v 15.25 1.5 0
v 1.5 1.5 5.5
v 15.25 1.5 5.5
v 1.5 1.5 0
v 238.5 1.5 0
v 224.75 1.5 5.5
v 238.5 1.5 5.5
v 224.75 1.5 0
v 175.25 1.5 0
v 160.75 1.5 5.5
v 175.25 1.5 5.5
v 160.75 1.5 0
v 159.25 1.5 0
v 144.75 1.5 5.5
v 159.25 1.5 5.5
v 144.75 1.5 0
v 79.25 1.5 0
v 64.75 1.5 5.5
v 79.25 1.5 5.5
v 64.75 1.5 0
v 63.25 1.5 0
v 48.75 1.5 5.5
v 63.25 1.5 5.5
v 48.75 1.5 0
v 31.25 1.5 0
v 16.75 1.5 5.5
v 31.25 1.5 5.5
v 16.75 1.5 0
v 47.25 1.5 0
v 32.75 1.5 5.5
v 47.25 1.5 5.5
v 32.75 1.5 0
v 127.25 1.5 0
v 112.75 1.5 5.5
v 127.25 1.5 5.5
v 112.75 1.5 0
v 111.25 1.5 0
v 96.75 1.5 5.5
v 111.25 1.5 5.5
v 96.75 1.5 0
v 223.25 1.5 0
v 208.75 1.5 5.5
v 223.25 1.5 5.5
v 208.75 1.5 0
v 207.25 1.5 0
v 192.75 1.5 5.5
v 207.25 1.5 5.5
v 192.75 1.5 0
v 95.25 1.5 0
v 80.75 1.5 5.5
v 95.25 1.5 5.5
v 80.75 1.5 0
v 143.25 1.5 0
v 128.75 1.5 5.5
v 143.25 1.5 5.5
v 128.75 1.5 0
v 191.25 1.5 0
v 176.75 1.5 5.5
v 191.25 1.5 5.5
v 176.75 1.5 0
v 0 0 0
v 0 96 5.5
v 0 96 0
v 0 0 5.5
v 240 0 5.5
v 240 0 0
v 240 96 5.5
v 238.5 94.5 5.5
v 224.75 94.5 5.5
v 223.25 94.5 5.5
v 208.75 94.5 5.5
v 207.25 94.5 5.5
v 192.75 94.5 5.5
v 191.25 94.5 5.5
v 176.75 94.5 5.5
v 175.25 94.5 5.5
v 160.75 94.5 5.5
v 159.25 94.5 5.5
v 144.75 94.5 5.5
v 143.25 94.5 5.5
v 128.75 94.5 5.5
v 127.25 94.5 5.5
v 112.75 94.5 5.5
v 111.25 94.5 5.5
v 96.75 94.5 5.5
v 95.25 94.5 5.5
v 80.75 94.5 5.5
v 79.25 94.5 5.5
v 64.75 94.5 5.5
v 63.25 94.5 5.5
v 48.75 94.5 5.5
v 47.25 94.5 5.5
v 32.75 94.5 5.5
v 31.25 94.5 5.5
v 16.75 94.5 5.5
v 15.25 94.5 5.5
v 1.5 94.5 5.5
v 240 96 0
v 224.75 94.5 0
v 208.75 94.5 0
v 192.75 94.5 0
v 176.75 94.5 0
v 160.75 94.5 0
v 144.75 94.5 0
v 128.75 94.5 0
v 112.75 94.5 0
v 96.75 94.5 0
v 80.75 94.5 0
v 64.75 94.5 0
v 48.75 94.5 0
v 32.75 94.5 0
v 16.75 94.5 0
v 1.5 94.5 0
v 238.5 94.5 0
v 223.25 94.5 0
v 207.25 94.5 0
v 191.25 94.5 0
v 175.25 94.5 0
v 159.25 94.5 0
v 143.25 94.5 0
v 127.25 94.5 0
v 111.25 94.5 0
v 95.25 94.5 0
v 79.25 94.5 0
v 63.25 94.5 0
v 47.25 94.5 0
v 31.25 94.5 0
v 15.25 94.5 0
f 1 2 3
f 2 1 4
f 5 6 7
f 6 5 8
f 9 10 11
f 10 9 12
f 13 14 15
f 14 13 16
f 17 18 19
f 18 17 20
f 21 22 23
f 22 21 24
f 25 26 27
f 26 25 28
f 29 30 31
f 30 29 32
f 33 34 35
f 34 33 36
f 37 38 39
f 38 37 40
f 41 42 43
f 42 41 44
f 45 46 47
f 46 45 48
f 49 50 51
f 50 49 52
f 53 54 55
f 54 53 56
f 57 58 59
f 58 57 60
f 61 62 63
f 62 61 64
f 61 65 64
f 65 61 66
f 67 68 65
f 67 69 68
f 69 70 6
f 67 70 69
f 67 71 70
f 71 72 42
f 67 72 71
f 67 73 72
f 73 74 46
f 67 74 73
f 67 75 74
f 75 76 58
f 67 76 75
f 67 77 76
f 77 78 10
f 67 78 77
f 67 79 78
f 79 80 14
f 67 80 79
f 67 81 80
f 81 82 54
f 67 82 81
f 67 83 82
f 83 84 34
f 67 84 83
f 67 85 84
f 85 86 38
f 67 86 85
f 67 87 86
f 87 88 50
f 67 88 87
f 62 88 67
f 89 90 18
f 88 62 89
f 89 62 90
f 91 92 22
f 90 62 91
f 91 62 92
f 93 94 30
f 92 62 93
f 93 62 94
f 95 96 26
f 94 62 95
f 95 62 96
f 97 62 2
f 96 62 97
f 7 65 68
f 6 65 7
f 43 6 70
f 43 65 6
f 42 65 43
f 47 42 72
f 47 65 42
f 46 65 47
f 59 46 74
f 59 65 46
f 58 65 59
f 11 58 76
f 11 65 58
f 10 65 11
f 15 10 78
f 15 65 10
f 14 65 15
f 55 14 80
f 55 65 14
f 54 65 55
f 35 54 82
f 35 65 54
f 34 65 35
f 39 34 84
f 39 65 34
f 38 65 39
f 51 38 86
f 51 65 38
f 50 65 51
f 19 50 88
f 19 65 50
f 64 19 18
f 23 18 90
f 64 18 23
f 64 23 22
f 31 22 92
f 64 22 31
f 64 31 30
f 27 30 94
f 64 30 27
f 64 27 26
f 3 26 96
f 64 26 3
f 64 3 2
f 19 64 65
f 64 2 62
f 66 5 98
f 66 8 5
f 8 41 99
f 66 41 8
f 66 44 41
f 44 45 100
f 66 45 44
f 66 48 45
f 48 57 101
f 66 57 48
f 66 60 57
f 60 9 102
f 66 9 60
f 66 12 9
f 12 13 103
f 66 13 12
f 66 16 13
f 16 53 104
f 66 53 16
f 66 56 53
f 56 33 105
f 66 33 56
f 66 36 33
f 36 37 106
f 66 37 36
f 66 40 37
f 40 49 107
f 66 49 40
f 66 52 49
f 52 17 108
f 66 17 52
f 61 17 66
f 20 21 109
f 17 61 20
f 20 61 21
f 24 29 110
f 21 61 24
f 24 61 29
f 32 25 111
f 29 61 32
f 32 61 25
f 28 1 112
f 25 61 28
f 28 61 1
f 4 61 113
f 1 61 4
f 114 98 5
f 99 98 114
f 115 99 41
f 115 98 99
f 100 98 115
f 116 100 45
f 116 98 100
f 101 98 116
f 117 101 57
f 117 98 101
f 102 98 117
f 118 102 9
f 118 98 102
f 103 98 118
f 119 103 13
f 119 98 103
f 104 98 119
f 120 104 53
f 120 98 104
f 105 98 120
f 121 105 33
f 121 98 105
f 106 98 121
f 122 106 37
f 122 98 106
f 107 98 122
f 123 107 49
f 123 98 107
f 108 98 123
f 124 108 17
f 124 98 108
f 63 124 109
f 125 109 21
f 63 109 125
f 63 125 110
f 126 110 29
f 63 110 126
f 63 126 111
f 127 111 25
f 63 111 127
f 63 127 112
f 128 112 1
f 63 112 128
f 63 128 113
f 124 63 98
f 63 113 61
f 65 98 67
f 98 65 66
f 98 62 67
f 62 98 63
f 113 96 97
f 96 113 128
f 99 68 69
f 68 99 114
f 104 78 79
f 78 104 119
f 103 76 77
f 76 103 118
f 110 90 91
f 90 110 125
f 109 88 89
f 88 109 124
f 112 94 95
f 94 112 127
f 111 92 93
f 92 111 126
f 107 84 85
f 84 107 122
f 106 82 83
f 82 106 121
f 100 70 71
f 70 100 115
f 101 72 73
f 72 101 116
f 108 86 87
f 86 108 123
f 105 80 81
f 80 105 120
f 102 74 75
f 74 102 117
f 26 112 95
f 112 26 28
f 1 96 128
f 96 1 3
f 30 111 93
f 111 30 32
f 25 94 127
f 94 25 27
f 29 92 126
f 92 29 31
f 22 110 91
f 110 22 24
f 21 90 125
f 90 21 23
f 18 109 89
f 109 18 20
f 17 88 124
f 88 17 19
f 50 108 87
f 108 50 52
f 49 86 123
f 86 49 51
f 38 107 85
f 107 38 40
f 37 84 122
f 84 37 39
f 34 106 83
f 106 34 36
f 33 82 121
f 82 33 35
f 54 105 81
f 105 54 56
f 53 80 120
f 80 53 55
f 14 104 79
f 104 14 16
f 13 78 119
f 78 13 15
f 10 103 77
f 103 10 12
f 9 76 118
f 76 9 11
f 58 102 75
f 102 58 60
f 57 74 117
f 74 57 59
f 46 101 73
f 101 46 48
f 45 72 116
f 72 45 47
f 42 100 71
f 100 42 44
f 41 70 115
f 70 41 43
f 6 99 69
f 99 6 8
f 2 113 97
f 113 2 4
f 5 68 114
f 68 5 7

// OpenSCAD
// file: lumber.scad
use <utilities.scad>;

/**
 * @module plank_2x4x8
 * @brief Models a nominal 2x4 lumber stick, 8 feet long.
 * 
 * @param cut Vector [x, y, z] specifying material trimmed from each dimension (in inches).
 * Useful for simulating cuts due to fit or length adjustments.
 */
module plank_2x4x8(cut = [0, 0, 0]) {
  echo("plank_2x4x8");
  cube([inches(1, 1 / 2) - cut[0], inches(3, 1 / 2) - cut[1], feet(8) - cut[2]]);
}
;

/**
 * @module plank_2x6x8
 * @brief Models a nominal 2x6 lumber stick, 8 feet long.
 * 
 * @param cut Vector [x, y, z] specifying material trimmed from each dimension (in inches).
 */
module plank_2x6x8(cut = [0, 0, 0]) {
  echo("plank_2x6x8");
  cube([inches(1, 1 / 2) - cut[0], inches(5, 1 / 2) - cut[1], feet(8) - cut[2]]);
}
;

/**
 * @module sheet_4x8x1_2
 * @brief Models a 4x8 foot plywood sheet with 1/2 inch thickness.
 * 
 * @param cut Vector [x, y, z] specifying material trimmed from each dimension (in inches).
 */
module sheet_4x8x1_2(cut = [0, 0, 0]) {
  echo("4x8x1/2");
  cube([feet(4) - cut[0], feet(8) - cut[1], inches(0, 1 / 2) - cut[2]]);
}
;

/**
 * @module sheet_4x8x3_4
 * @brief Models a 4x8 foot plywood sheet with 3/4 inch thickness.
 * 
 * @param cut Vector [x, y, z] specifying material trimmed from each dimension (in inches).
 */
module sheet_4x8x3_4(cut = [0, 0, 0]) {
  echo("4x8x3/4");
  cube([feet(4) - cut[0], feet(8) - cut[1], inches(0, 3 / 4) - cut[2]]);
}
;

plank_2x4x8();

translate([24, 0, 0])
  plank_2x6x8();

translate([48, 0, 0])
  sheet_4x8x1_2();

translate([120, 0, 0])
  sheet_4x8x3_4();
// file: utilities.scad
// Utility functions 

/**
 * @function feet
 * @brief Converts feet to inches.
 * @param f Value in feet.
 * @return Equivalent value in inches.
 */
function feet(f) = f * 12;

/**
 * @function inches
 * @brief Combines whole and fractional inches.
 * @param i Whole inches.
 * @param f Fractional inches.
 * @return Total in inches.
 */
function inches(i = 0, f = 0) = i + f;
// main file
use <utilities.scad>;
use <lumber.scad>;

/**
 * @module frame_floor
 * @brief Constructs a platform frame floor using 2x6 lumber.
 *
 * @param width Total width of the floor (X direction).
 * @param depth Total depth of the floor (Y direction).
 *
 * Generates rim and floor joists spaced at 16" centers with appropriate trimming.
 */
module frame_floor(width = feet(20), depth = feet(8)) {
  // South Rim Joists
  for (x = [0:feet(8):width]) {
    trim = x + feet(8) > width ? [0, 0, x + feet(8) - width] : [0, 0, 0];

    translate([x, 0, 0])
      rotate(a=[0, 90, 0])
        rotate(a=90, v=[0, 0, 1])
          plank_2x6x8(cut=trim);
  }

  // North Rim Joists
  for (x = [width:feet(8) * -1:1]) {
    echo(x - feet(8)); trim = x - feet(8) < 0 ? [0, 0, feet(8) - x] : [0, 0, 0];

    translate([x - feet(8) + trim[2], depth - inches(1, 1 / 2), 0])
      rotate(a=[0, 90, 0])
        rotate(a=90, v=[0, 0, 1])
          plank_2x6x8(cut=trim);
  }

  // floor joists
  translate([0, inches(1, 1 / 2), inches(5, 1 / 2)])
    rotate(a=[270, 0, 00])
      plank_2x6x8(cut=[0, 0, feet(8) - depth + inches(3)]);

  for (x = [inches(15, 1 / 4):inches(16):width - inches(1, 1 / 2)]) {
    translate([x, inches(1, 1 / 2), inches(5, 1 / 2)])
      rotate(a=[270, 0, 00])
        plank_2x6x8(cut=[0, 0, feet(8) - depth + inches(3)]);
  }

  translate([width - inches(1, 1 / 2), inches(1, 1 / 2), inches(5, 1 / 2)])
    rotate(a=[270, 0, 00])
      plank_2x6x8(cut=[0, 0, feet(8) - depth + inches(3)]);
}

frame_floor(feet(20),feet(8));
